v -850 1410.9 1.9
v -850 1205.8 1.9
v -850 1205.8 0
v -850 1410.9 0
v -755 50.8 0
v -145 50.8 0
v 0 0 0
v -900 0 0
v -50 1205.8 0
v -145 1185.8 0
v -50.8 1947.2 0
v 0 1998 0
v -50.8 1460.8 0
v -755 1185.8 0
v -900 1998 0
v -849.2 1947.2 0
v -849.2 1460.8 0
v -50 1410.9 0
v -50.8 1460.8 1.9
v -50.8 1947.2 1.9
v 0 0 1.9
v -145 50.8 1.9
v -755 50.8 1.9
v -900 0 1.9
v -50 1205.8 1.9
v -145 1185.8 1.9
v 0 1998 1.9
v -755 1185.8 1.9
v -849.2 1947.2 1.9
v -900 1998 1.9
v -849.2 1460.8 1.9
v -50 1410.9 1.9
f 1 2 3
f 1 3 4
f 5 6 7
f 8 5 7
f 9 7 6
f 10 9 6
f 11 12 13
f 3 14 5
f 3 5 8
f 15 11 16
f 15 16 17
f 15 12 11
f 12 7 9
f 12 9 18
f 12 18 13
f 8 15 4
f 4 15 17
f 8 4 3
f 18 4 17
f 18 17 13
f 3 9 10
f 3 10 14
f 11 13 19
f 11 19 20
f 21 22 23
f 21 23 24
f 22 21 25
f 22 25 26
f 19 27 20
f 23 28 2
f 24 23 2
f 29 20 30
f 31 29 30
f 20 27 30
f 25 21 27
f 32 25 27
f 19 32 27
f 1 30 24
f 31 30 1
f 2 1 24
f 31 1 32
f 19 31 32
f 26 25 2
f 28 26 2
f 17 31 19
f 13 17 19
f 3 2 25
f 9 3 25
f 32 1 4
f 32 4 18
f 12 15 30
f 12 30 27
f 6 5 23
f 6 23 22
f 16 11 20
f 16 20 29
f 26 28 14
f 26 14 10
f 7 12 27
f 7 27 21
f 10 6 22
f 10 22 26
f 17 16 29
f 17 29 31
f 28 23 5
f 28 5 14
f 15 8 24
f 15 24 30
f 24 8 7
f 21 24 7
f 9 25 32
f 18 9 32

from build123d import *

# Parameters (mm, degrees)
CROQUIS1_W              = 900
CROQUIS1_H              = 1190.8
CROQUIS1_W_2            = 610
CROQUIS1_H_2            = 1120
SALIENTE_EXTRUIR1_DEPTH = 1.9
CROQUIS2_W              = 900
CROQUIS2_H              = 270
SALIENTE_EXTRUIR2_DEPTH = 1.9
CROQUIS4_W              = 800
CROQUIS4_H              = 220
CORTAR_EXTRUIR1_DEPTH   = 1.9
CROQUIS6_W              = 610
CROQUIS6_H              = 15
CORTAR_EXTRUIR2_DEPTH   = 10
CROQUIS7_W              = 800
CROQUIS7_H              = 14.9
SALIENTE_EXTRUIR3_DEPTH = 1.9
SALIENTE_EXTRUIR4_DEPTH = 1.9


with BuildPart() as part:
    # Croquis1 → Saliente-Extruir1 (new body)
    with BuildSketch(Plane.XY):
        with Locations((-450, 595.4)):
            Rectangle(CROQUIS1_W, CROQUIS1_H)
        with Locations((-450, 610.8)):
            Rectangle(CROQUIS1_W_2, CROQUIS1_H_2, mode=Mode.SUBTRACT)
    extrude(amount=SALIENTE_EXTRUIR1_DEPTH)

    # Croquis2 → Saliente-Extruir2 (add)
    with BuildSketch(Plane.XY.offset(1.9)):
        with Locations((-450, 1325.8)):
            Rectangle(CROQUIS2_W, CROQUIS2_H)
    extrude(amount=-SALIENTE_EXTRUIR2_DEPTH)

    # Croquis4 → Cortar-Extruir1 (cut)
    with BuildSketch(Plane.XY.offset(1.9)):
        with Locations((-450, 1315.8)):
            Rectangle(CROQUIS4_W, CROQUIS4_H)
    extrude(amount=-CORTAR_EXTRUIR1_DEPTH, mode=Mode.SUBTRACT)

    # Croquis6 → Cortar-Extruir2 (cut)
    with BuildSketch(Plane.XY.offset(1.9)):
        with Locations((-450, 1178.3)):
            Rectangle(CROQUIS6_W, CROQUIS6_H)
    extrude(amount=-CORTAR_EXTRUIR2_DEPTH, mode=Mode.SUBTRACT)

    # Croquis7 → Saliente-Extruir3 (add)
    with BuildSketch(Plane.XY.offset(1.9)):
        with Locations((-450, 1418.35)):
            Rectangle(CROQUIS7_W, CROQUIS7_H)
    extrude(amount=-SALIENTE_EXTRUIR3_DEPTH)

    # Croquis8 → Saliente-Extruir4 (add)
    with BuildSketch(Plane(origin=(0, 0, 0), x_dir=(-1, 0, 0), z_dir=(0, 0, -1))):
        Polygon((0, 1998), (0, 1460.8), (50.800000001, 1460.8), (50.8, 1947.2), (849.2, 1947.2), (849.200000001, 1460.8), (900, 1460.8), (900, 1998), align=None)
    extrude(amount=-SALIENTE_EXTRUIR4_DEPTH)


solid = part.part
